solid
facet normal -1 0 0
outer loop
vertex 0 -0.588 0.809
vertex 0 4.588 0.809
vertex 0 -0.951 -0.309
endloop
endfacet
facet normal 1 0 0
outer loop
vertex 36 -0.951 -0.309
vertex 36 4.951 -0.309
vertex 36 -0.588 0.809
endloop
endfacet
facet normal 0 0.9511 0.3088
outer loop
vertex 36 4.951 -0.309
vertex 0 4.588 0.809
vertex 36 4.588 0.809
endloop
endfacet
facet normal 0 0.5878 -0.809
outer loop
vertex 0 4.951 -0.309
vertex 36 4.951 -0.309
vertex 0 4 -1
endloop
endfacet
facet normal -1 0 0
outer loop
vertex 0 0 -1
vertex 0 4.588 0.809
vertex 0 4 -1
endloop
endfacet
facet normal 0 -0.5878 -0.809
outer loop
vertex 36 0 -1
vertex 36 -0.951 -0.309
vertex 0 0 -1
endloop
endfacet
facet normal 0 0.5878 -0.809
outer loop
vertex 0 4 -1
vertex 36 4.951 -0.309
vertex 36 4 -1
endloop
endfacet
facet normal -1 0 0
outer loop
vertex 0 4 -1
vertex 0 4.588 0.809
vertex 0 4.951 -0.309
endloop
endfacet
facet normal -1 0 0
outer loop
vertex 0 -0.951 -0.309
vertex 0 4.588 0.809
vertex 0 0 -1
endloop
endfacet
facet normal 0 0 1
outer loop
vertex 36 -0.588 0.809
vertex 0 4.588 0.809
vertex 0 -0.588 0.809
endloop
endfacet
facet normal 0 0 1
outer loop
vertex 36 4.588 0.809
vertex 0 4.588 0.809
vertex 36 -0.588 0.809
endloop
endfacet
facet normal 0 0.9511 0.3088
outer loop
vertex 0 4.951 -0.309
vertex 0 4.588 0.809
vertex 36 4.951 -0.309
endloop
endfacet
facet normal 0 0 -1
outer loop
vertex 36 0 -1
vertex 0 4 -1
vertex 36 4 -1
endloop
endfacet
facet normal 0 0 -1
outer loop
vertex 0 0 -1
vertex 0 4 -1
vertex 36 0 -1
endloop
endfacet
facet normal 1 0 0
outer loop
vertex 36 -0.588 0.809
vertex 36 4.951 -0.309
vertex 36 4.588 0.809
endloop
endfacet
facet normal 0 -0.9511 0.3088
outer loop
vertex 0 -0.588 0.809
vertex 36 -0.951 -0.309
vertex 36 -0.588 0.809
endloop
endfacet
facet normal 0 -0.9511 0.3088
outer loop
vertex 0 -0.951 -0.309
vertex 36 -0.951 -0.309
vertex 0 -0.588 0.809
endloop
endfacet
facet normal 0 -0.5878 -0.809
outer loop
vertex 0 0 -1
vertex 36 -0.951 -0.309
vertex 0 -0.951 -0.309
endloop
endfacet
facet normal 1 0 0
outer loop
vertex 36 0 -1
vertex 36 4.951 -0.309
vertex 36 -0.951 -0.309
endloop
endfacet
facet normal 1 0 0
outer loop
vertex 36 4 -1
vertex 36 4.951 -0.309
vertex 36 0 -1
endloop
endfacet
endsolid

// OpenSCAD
// Variables

// The handle of the lawn mower is not perfect cylinder
// It is taller than it is wide. 21.4mm tall and 21 mm wide
// I use a circle that is slightly bigger for now. 
mowerHandleRadius   = 21.5 / 2;

// Size of the main base
baseMountLength = 40;
baseMountWidth = 28;
baseMountPartWidth = baseMountWidth / 2;

screwWidth = 5;
screwHeadDiameter = 8;
screwHeadDepth = 3;
screwHeadHoleDepth = 2.2;

cylinderPoleWidth = 7.5;
cylinderPoleLength = baseMountPartWidth; //Length of th connecting pole

jointPartWidth = baseMountWidth / 3;

module mainPart(isLeft = true)
{

        // The outer base part
        mountBasePart(isLeft = isLeft);

        %union() 
        {
            // Inner handle pole
        translate( [baseMountLength / 2, 0, baseMountWidth / 2] ) 
        rotate([-90,0,0]) handlePole();    

        // The hinge part
        hingePart(partWidth = 10, thicknes = jointPartWidth);

        }

        

    
}

module mountBasePart(isLeft = true) {
    
    %difference() {
        // Outer cube
        cube([baseMountLength ,baseMountPartWidth, baseMountWidth]);
        
        // Inner cylinder cutout
        translate([0,baseMountPartWidth,baseMountPartWidth]) 
        rotate([0,90,0])
        cylinder(h =baseMountLength, r = mowerHandleRadius);
    }

    mountRimJoiner(length = baseMountLength - 4);
}

// small cylinders that can be either added or cutout or added to the base rim 
module mountRimJoiner(length = 10, depth = 4, thicknes = 2)
{
    rotate([0,90,0]) 
    hull()
    {
        cylinder(h = length, r = thicknes / 2);
    
        translate([0,depth,0]) cylinder(h = length, r = thicknes / 2);
    }
   


}

// The  hinge Part is the part that joins the mount part witht the handle part
module hingePart(partWidth = 10, thicknes = 1, location = "left") {
    rotate([-90,0,0])
    linear_extrude(height = thicknes)  
    hull() {
        square(size = partWidth, center = false);
        translate([partWidth / 2, partWidth, 0]) circle(r = partWidth / 2);
    }
}

module handlePole(screwThicknes = 4.9)
{
    difference() 
    {
        // Outer Cylinder
        cylinder(h = baseMountPartWidth, r = cylinderPoleWidth / 2);

        // Inner Cylinder
        cylinder(h = baseMountPartWidth, r = screwThicknes / 2 );
    }
    
}

mainPart();
//handlePole();
//mountPart();
//jointPart(partWidth = 10, thicknes = jointPartWidth);

//color("blue") jointPart(partWidth = 10, thicknes = 2);
